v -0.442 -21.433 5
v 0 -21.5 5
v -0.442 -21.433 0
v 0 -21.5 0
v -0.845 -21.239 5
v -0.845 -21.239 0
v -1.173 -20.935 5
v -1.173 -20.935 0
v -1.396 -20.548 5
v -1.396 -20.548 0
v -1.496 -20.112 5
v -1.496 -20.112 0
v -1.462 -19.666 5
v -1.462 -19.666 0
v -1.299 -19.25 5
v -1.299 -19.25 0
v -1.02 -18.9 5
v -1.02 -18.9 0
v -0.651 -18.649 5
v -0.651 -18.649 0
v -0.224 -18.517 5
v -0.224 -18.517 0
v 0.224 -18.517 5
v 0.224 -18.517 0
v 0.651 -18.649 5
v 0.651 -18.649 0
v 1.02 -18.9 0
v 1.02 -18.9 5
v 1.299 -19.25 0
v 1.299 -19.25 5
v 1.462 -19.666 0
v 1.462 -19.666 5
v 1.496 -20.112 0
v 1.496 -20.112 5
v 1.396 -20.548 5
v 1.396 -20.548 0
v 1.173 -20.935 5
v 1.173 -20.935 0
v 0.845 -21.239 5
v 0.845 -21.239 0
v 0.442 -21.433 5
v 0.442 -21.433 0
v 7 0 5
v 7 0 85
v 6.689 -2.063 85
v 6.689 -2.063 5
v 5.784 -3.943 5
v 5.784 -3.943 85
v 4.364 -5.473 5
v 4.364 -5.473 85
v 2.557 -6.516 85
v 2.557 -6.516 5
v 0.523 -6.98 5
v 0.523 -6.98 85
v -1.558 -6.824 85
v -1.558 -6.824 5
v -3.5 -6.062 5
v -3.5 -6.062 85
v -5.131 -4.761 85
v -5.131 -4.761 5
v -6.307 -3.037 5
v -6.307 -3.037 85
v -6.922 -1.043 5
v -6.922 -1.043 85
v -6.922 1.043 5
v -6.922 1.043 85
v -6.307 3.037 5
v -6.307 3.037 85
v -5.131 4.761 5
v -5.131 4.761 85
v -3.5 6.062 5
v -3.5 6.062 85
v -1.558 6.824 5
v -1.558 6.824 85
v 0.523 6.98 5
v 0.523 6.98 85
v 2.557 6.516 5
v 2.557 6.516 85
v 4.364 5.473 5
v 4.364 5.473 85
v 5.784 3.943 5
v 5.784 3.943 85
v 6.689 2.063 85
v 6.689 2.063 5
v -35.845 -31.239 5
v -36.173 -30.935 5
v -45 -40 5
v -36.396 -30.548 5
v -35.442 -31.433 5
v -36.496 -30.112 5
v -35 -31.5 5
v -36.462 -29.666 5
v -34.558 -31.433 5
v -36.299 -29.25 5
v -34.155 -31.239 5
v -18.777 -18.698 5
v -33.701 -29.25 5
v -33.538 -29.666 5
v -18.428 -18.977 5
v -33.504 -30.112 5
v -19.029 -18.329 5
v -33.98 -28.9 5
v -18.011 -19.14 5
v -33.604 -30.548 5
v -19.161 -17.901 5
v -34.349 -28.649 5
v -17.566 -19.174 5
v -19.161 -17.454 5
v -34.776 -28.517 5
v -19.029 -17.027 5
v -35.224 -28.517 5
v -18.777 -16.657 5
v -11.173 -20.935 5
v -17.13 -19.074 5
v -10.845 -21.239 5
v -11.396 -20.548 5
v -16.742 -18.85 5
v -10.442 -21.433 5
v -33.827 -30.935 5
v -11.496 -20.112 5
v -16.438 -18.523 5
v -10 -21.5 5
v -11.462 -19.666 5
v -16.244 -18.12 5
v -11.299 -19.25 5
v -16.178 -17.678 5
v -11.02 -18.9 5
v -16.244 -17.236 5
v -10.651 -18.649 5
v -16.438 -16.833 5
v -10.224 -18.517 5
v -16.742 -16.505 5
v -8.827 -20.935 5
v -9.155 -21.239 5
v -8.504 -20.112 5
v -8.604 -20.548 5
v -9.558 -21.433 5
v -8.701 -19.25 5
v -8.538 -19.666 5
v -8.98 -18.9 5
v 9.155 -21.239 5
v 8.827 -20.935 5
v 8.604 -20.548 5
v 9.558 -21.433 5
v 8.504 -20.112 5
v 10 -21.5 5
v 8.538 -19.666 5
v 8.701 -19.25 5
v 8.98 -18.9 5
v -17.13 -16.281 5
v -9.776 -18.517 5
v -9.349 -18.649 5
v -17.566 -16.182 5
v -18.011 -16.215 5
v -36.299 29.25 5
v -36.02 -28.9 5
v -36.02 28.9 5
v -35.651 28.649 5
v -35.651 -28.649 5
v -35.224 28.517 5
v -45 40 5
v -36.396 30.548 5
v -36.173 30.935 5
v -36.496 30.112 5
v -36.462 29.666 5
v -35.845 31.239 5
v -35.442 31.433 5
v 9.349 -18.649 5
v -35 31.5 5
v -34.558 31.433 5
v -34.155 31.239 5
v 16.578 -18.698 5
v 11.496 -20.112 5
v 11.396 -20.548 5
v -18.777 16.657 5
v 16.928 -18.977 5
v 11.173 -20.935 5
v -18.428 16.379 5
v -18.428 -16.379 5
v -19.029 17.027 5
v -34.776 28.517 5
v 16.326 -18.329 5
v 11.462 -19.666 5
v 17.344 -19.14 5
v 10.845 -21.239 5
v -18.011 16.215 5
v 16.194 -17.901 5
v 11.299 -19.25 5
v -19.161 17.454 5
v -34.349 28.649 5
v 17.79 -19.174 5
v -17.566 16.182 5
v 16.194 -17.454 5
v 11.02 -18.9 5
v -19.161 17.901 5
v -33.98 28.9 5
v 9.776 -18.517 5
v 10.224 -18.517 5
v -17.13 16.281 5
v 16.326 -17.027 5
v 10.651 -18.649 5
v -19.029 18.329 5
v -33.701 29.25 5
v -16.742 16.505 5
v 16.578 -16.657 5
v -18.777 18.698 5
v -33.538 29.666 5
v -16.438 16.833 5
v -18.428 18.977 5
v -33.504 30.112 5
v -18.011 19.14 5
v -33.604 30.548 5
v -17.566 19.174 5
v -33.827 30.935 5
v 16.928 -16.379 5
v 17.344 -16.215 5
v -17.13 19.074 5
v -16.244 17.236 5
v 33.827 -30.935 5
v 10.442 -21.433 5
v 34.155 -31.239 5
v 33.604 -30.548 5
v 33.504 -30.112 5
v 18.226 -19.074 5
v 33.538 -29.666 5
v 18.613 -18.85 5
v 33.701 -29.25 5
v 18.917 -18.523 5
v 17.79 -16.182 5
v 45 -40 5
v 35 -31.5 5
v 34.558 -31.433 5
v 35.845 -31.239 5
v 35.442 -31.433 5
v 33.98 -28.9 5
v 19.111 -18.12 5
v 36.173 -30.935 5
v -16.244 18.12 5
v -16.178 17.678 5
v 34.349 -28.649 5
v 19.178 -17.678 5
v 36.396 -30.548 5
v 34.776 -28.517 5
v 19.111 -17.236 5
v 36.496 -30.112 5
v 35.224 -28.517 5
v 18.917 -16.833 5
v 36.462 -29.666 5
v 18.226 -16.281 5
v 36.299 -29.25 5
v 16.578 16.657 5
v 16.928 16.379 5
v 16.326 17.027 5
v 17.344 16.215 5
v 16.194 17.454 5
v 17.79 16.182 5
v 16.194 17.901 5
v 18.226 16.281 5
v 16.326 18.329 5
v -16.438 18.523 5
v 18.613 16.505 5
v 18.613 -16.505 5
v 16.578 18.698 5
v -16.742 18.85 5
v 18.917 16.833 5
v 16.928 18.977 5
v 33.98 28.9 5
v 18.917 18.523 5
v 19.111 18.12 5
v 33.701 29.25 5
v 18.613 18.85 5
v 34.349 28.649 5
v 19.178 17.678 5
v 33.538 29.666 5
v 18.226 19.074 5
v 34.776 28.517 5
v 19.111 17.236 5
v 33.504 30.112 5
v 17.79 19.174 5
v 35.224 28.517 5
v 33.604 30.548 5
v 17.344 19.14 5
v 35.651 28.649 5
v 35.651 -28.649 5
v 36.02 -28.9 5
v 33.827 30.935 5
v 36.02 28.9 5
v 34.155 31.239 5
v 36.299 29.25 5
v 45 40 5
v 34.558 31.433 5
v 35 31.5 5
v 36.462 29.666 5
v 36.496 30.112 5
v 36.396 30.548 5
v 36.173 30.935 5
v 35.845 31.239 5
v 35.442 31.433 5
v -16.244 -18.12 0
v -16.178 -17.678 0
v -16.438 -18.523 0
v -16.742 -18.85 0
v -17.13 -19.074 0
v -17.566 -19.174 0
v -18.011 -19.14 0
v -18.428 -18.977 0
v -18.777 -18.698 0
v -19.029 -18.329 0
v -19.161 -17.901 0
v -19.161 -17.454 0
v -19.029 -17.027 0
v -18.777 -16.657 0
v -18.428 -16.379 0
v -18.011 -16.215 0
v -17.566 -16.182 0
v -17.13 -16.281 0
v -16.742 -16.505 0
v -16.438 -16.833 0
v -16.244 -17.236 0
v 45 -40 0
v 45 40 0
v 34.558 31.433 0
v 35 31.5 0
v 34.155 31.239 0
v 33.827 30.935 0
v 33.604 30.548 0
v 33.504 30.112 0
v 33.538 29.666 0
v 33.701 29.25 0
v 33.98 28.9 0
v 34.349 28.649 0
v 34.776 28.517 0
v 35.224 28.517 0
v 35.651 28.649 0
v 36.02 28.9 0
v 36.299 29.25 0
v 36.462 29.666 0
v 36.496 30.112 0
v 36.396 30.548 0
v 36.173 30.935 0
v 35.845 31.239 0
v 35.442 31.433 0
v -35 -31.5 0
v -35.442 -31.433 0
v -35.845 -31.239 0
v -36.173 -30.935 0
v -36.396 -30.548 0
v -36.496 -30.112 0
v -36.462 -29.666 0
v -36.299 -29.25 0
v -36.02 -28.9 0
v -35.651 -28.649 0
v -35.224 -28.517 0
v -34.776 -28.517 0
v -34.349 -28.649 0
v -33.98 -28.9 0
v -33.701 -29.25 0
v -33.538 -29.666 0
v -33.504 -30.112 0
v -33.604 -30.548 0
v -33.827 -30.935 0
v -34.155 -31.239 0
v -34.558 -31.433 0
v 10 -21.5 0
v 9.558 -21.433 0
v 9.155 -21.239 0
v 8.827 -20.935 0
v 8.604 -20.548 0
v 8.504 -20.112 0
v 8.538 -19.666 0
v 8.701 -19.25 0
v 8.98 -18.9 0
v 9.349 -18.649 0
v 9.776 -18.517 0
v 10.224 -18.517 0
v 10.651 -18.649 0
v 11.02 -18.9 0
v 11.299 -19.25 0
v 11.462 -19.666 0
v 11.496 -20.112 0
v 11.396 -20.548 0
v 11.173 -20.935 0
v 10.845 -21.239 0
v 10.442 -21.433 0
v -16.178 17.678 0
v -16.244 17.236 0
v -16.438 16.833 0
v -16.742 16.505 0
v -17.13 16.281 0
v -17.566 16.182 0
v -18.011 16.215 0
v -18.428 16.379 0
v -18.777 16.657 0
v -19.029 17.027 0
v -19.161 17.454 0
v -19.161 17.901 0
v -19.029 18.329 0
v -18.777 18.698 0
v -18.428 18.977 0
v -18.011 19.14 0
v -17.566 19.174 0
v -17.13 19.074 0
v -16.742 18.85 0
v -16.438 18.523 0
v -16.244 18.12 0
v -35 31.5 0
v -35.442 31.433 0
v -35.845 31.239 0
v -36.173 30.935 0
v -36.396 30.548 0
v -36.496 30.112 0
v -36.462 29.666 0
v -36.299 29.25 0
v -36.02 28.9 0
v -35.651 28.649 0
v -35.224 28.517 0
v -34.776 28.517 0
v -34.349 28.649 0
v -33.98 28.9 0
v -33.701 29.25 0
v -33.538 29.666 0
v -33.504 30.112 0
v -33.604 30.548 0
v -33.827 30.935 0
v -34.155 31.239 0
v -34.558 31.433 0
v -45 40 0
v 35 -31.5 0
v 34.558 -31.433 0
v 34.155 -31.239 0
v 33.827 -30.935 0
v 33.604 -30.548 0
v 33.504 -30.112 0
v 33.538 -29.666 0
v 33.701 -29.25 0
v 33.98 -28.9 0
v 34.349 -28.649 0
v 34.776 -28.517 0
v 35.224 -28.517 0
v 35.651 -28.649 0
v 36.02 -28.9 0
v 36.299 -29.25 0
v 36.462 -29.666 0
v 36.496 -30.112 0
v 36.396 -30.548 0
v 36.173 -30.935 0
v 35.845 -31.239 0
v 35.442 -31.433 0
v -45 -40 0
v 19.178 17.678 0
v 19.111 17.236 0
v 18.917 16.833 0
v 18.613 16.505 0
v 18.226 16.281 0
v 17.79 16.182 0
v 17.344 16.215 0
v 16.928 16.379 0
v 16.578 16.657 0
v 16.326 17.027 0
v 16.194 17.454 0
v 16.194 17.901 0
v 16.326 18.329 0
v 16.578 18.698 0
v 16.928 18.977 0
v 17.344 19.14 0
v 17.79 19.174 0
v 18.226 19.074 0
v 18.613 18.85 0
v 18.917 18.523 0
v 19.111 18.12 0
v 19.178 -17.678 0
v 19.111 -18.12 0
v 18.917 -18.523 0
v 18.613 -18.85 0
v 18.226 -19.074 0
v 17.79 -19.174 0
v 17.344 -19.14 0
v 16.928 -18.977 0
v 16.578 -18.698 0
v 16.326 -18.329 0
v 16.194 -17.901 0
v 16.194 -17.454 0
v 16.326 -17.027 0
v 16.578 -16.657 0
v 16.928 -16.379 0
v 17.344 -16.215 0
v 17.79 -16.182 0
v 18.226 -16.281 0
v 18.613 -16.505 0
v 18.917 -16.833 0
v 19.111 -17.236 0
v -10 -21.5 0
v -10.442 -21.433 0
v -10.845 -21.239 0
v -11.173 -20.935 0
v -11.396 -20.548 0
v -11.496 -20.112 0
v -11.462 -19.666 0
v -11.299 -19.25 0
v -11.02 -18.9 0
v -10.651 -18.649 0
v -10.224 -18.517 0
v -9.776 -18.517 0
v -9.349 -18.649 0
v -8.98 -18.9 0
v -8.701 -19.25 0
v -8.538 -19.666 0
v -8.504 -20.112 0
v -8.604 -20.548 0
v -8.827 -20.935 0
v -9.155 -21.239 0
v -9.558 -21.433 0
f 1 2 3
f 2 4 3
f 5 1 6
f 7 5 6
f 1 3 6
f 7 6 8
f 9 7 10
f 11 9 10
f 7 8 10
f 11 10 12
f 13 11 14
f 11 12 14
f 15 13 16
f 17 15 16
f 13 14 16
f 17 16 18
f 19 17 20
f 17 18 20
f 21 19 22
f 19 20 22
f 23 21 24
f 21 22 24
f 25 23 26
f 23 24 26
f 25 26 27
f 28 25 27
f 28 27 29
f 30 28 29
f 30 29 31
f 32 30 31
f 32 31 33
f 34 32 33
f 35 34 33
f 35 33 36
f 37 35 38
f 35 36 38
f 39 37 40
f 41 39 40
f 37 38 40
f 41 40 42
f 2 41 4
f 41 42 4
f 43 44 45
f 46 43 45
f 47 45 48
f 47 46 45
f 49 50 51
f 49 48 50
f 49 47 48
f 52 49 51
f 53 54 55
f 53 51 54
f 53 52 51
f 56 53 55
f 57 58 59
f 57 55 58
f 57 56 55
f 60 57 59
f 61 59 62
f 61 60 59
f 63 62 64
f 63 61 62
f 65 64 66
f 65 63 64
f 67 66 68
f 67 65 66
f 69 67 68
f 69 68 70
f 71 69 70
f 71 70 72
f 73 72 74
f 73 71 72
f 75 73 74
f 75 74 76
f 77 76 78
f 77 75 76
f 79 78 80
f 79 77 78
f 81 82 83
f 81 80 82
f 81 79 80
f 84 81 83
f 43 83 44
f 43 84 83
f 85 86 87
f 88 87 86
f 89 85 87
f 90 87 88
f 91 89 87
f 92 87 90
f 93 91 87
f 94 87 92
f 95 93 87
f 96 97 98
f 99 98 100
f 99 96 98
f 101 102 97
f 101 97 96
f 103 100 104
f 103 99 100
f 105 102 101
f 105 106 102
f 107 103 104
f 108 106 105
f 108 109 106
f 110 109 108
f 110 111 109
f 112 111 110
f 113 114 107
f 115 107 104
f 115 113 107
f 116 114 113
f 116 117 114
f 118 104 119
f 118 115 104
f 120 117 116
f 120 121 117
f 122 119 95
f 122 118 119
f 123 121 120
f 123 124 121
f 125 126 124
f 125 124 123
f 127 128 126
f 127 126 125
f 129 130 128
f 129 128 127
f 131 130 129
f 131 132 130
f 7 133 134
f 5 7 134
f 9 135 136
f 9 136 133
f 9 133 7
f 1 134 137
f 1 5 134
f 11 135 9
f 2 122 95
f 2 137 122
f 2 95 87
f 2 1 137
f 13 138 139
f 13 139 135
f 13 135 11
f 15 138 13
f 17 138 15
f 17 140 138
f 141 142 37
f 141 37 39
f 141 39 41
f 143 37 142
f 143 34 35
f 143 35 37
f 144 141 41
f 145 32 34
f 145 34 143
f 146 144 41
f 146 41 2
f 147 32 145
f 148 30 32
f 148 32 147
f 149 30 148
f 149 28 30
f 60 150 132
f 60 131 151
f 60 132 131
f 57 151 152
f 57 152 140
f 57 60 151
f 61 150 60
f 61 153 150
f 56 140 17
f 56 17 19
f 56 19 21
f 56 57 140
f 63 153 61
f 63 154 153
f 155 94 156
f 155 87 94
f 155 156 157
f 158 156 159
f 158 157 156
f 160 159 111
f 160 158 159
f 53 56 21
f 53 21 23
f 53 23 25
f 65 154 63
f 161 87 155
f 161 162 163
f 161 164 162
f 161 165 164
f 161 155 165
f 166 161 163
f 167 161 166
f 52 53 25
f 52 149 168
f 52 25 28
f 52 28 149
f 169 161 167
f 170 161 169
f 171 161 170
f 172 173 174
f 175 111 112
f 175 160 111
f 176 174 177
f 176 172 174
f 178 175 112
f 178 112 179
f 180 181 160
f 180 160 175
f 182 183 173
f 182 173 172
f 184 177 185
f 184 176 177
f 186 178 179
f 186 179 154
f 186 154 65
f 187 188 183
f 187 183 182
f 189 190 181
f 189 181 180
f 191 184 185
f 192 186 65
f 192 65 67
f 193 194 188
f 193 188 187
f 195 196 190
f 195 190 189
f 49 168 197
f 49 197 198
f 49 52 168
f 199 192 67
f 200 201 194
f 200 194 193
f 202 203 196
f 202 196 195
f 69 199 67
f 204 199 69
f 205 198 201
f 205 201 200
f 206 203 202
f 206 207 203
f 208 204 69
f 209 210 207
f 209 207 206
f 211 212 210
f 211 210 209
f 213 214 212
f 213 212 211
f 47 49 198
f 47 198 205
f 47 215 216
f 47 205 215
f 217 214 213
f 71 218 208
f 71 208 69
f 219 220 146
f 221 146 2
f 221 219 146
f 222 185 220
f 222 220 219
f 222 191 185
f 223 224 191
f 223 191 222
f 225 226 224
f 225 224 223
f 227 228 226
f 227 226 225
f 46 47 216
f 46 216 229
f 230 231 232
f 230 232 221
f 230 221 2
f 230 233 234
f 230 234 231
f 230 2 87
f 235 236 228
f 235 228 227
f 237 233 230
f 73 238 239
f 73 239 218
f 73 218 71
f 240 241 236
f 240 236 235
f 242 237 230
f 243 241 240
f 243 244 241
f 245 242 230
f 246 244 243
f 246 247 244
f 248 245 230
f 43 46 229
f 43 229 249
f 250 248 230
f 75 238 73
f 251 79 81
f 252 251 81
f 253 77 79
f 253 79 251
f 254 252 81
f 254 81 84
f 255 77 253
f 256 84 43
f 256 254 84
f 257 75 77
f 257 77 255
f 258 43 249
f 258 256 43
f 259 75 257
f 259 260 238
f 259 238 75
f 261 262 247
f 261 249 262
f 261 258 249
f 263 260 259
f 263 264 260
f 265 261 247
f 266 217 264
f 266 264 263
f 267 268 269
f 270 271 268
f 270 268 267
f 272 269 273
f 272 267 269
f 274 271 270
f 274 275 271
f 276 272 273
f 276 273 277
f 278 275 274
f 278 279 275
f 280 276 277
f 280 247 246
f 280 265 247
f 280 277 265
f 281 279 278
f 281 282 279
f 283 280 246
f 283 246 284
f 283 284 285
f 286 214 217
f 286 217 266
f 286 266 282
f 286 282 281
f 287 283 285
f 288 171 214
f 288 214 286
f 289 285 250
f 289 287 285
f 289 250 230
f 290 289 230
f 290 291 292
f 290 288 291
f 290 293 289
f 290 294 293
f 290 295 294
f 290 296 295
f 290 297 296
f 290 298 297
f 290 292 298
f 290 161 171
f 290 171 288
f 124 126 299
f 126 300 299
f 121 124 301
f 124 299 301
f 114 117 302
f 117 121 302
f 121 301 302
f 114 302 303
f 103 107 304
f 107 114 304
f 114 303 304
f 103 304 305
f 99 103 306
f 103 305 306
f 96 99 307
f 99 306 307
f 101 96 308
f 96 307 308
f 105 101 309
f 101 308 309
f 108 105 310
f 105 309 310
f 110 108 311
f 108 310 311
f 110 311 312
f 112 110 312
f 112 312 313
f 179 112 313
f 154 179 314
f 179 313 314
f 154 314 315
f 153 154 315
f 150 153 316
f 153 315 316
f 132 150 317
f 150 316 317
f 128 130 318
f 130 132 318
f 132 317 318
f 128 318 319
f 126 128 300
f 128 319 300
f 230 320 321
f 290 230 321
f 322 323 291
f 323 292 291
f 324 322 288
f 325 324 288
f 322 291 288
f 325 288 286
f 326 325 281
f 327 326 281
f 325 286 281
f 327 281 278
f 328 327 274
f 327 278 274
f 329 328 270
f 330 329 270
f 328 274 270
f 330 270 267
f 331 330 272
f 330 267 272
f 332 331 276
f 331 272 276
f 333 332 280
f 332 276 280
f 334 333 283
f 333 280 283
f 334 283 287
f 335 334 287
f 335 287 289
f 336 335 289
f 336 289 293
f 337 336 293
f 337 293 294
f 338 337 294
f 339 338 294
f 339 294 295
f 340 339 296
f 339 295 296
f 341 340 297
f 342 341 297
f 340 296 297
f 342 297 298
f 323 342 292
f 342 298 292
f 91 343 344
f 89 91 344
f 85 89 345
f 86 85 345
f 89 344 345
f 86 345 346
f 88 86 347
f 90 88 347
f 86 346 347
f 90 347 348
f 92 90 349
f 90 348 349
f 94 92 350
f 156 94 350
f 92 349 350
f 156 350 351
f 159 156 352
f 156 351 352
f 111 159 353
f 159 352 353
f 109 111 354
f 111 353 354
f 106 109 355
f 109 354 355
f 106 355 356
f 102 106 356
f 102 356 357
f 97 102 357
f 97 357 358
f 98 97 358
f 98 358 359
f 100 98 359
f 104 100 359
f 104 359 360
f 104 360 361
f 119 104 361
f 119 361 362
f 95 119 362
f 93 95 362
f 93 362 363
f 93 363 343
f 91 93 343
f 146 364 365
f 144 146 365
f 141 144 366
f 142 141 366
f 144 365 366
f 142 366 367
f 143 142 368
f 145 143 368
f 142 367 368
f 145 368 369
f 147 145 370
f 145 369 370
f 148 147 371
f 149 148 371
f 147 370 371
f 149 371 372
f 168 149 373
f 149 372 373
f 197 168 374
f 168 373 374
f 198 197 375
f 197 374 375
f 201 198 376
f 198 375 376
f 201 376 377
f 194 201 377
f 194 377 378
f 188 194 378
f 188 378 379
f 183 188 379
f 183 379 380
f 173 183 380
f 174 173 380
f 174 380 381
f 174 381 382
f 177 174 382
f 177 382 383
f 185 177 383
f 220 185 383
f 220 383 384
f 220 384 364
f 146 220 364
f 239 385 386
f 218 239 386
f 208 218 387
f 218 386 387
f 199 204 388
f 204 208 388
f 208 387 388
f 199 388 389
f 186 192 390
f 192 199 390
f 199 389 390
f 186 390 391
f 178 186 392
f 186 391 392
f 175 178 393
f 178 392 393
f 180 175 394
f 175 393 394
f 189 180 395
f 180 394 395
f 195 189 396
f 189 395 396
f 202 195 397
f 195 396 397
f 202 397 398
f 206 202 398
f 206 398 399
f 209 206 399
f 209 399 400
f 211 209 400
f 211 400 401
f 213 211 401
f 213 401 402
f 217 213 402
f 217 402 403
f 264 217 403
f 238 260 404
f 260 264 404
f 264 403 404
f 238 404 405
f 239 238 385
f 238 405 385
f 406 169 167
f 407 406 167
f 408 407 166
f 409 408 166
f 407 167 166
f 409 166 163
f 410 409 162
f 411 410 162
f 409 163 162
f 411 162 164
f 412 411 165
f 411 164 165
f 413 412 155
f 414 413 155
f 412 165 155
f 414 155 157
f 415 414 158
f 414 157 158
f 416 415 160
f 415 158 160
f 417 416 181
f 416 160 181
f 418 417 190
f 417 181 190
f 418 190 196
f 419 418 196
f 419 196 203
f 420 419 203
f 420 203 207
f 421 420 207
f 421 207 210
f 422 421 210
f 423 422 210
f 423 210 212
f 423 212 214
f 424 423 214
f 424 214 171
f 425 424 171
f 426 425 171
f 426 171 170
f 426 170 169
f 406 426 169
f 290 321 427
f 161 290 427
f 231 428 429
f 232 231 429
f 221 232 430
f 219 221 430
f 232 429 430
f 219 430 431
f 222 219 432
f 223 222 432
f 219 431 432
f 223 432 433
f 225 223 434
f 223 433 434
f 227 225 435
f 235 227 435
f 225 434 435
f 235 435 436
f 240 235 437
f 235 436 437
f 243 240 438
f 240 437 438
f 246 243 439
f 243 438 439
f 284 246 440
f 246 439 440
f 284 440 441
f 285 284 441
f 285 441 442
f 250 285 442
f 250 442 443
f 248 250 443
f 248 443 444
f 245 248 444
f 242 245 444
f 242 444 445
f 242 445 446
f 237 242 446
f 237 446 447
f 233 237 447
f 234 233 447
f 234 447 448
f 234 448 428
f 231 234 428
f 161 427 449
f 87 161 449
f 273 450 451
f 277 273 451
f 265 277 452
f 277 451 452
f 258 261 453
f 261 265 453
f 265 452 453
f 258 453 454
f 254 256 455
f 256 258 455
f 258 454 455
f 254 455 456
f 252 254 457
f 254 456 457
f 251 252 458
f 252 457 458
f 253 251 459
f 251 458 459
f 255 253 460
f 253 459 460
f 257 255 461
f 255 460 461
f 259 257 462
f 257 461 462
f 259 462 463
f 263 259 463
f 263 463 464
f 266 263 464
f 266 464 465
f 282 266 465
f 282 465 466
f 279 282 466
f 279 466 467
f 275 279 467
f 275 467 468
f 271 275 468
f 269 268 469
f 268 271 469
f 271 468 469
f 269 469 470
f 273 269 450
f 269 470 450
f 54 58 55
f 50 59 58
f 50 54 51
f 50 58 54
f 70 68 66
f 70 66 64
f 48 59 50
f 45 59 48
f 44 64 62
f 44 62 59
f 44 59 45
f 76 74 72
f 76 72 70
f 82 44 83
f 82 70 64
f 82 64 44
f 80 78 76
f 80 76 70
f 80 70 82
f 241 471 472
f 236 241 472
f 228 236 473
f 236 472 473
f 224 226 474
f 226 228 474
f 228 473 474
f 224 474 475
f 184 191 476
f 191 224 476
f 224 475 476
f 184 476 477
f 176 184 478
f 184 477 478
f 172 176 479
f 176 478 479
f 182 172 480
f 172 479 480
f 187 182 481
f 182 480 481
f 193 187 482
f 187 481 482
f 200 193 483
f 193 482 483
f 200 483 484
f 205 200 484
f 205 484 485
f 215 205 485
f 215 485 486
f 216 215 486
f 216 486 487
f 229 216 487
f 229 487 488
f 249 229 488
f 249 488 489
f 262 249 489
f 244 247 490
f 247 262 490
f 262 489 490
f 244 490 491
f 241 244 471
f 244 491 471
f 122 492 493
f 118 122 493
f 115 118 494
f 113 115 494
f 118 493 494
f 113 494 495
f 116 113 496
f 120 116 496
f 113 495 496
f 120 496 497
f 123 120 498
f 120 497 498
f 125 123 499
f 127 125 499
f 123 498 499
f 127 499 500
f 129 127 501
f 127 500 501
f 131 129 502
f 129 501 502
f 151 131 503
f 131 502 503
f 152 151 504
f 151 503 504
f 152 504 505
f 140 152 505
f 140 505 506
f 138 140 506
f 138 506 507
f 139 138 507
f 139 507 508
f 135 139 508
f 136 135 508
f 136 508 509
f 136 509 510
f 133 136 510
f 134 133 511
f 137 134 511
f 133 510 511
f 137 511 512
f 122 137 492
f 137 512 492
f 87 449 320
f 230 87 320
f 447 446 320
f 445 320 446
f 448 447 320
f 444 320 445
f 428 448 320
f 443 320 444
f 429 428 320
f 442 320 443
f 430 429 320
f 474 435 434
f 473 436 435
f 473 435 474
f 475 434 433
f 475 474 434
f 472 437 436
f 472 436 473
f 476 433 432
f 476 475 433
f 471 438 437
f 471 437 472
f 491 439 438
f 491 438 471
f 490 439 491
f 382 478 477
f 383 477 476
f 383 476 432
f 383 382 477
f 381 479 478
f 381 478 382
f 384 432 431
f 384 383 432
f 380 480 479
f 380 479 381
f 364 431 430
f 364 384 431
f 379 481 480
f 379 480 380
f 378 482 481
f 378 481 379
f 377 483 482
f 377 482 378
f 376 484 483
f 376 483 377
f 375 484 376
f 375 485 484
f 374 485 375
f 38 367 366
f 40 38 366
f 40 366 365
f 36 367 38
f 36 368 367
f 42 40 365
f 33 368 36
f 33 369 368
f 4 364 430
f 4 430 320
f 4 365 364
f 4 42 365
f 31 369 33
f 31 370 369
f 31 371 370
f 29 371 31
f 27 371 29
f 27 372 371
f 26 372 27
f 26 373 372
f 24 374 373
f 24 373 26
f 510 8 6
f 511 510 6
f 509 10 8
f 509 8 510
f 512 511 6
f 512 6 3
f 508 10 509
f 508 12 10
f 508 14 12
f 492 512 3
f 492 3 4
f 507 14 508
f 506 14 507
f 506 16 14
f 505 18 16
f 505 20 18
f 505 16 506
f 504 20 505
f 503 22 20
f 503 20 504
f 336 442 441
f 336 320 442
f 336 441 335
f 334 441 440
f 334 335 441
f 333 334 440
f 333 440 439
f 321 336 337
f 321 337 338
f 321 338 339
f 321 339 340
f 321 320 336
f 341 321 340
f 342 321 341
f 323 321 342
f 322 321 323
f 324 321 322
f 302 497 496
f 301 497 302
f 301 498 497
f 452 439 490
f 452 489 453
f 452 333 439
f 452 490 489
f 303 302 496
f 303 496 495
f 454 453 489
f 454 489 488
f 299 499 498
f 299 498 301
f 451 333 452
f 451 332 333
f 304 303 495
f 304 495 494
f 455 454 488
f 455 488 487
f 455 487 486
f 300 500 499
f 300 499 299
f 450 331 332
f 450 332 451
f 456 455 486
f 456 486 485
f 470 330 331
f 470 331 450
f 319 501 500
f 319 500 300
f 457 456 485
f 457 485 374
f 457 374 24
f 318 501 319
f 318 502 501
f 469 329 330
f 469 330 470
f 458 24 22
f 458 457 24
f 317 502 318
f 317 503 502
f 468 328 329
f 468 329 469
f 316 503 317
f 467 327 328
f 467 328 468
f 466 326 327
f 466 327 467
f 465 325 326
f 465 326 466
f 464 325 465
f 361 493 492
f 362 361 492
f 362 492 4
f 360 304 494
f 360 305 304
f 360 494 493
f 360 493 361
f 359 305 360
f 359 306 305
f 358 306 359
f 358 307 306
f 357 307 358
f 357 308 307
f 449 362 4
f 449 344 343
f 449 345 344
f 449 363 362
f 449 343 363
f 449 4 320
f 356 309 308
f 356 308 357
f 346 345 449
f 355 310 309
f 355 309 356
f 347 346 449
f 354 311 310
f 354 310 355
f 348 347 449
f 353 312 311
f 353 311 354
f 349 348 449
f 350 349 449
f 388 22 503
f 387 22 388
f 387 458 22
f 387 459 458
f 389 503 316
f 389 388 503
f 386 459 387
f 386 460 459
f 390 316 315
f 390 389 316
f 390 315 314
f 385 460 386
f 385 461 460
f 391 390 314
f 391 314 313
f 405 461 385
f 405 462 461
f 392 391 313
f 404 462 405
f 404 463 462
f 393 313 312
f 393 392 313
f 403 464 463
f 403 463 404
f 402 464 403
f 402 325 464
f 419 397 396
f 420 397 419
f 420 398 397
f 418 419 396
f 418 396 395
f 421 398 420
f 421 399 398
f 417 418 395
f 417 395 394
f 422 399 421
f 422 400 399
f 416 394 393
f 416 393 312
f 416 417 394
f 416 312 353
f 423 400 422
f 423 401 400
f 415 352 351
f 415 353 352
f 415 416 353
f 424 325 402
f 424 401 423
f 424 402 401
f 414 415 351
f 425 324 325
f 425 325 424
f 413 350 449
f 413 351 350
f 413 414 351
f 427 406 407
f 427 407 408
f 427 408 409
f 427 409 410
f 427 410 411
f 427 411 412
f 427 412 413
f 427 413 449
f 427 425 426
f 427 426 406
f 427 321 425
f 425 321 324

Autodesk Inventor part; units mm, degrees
ref_plane "YZ Plane" through (0, 0, 0) normal (1, 0, 0) x (0, 1, 0)
ref_plane "XZ Plane" through (0, 0, 0) normal (0, 1, 0) x (-1, 0, 0)
ref_plane "XY Plane" through (0, 0, 0) normal (0, 0, 1) x (1, 0, 0)
sketch "スケッチ1" plane through (0, 0, 0) normal (0, 0, 1) x (1, 0, 0)
  circle A0 centre (-17.6777, 17.6777) radius 1.5
  circle A1 centre (17.6777, -17.6777) radius 1.5
  circle A2 centre (-17.6777, -17.6777) radius 1.5
  circle A3 centre (17.6777, 17.6777) radius 1.5
  line L0 (45, 40) -> (-45, 40)
  line L1 (-45, 40) -> (-45, -40)
  line L2 (-45, -40) -> (45, -40)
  line L3 (45, -40) -> (45, 40)
  line L4 (-5.5, 19.2289) -> (-5.5, 28)
  line L5 (-5.5, 28) -> (5.5, 28)
  line L6 (5.5, 28) -> (5.5, 19.2289)
  arc A4 (-5.5, 19.2289) -> (5.5, 19.2289) centre (0, 0) ccw
extrude "押し出し1" add sketch "スケッチ1" along normal blind 5
sketch "スケッチ2" plane through (0, 0, 0) normal (0, 0, -1) x (-1, 0, 0)
  line L0 (-5.5, 28) -> (5.5, 28) projected
  line L1 (5.5, 28) -> (5.5, 19.2289) projected
  arc A0 (-5.5, 19.2289) -> (5.5, 19.2289) centre (0, 0) ccw projected
  line L2 (-5.5, 19.2289) -> (-5.5, 28) projected
  circle A1 centre (0, 0) radius 20
  line L3 (-5.5, 19.2289) -> (-5.5, 28)
  line L4 (5.5, 28) -> (5.5, 19.2289)
extrude "押し出し2" add sketch "スケッチ2" against normal blind 5 contours L0 L1 A1 L2
sketch "スケッチ3" plane through (0, 0, 0) normal (0, 0, -1) x (-1, 0, 0)
  circle A0 centre (0, 0) radius 20 projected
  circle A1 centre (0, 0) radius 20
extrude "押し出し3" add sketch "スケッチ3" against normal blind 5
sketch "スケッチ4" plane through (0, 0, 5) normal (0, 0, 1) x (1, 0, 0)
  line L0 (-45, -40) -> (45, -40) projected
  line L1 (45, -40) -> (45, 40) projected
  line L2 (0, -40) -> (0, -20)
  line L3 (0, -20) -> (-10, -20)
  line L4 (-10, -20) -> (10, -20)
  line L5 (-45, -40) -> (-35, -40)
  line L6 (-35, -40) -> (-35, -30)
  line L7 (-35, -30) -> (-45, -30)
  line L8 (-45, -30) -> (-45, -40)
  line L9 (45, -40) -> (35, -40)
  line L10 (35, -40) -> (35, -30)
  line L11 (35, -30) -> (45, -30)
  line L12 (45, -30) -> (45, -40)
  point P0 (0, 0)
  dimension "d6" = 20
  dimension "d7" = 10
  dimension "d8" = 20
  dimension "d9" = 10
  dimension "d10" = 10
  dimension "d11" = 10
  dimension "d12" = 10
hole "穴1" at (-35, -30, 5) at (-10, -20, 5) at (0, -20, 5) at (10, -20, 5) at (35, -30, 5) direction (0, 0, -1) diameter 3 depth 8 tip angle 118
sketch "スケッチ5" plane through (0, 0, 5) normal (0, 0, 1) x (1, 0, 0)
  circle A0 centre (0, 0) radius 7
  dimension "d20" = 14
sketch "スケッチ6" plane through (0, 0, 5) normal (0, 0, 1) x (1, 0, 0)
  circle A0 centre (10, -20) radius 1.5 projected
  circle A1 centre (-10, -20) radius 1.5 projected
  circle A2 centre (-35, -30) radius 1.5 projected
  circle A3 centre (0, -20) radius 1.5 projected
  circle A4 centre (35, -30) radius 1.5 projected
  circle A5 centre (17.6777, 17.6777) radius 1.5 projected
  circle A6 centre (-17.6777, -17.6777) radius 1.5 projected
  circle A7 centre (17.6777, -17.6777) radius 1.5 projected
  circle A8 centre (-17.6777, 17.6777) radius 1.5 projected
  line L0 (45, 40) -> (-45, 40) projected
  line L1 (-45, 40) -> (-45, -40) projected
  line L2 (-45, -40) -> (45, -40) projected
  line L3 (45, -40) -> (45, 40) projected
  point P0 (0, 0)
extrude "押し出し4" add sketch "スケッチ5" along normal blind 80
sketch "スケッチ7" plane through (0, 0, 0) normal (0, 0, -1) x (-1, 0, 0)
  line L0 (-45, 40) -> (-35, 40)
  line L1 (-35, 40) -> (-35, 30)
  line L2 (-35, 30) -> (-45, 30)
  line L3 (-45, 30) -> (-45, 40)
  line L4 (45, 40) -> (35, 40)
  line L5 (35, 40) -> (35, 30)
  line L6 (35, 30) -> (45, 30)
  line L7 (45, 30) -> (45, 40)
  point P0 (0, 0)
  dimension "d24" = 10
  dimension "d25" = 10
  dimension "d26" = 10
  dimension "d27" = 10
hole "穴2" at (35, 30, 0) at (-35, 30, 0) direction (0, 0, 1) diameter 3 depth 8 tip angle 118
properties part number "知能ロボコンばね受け受け" material "ABS プラスチック"
